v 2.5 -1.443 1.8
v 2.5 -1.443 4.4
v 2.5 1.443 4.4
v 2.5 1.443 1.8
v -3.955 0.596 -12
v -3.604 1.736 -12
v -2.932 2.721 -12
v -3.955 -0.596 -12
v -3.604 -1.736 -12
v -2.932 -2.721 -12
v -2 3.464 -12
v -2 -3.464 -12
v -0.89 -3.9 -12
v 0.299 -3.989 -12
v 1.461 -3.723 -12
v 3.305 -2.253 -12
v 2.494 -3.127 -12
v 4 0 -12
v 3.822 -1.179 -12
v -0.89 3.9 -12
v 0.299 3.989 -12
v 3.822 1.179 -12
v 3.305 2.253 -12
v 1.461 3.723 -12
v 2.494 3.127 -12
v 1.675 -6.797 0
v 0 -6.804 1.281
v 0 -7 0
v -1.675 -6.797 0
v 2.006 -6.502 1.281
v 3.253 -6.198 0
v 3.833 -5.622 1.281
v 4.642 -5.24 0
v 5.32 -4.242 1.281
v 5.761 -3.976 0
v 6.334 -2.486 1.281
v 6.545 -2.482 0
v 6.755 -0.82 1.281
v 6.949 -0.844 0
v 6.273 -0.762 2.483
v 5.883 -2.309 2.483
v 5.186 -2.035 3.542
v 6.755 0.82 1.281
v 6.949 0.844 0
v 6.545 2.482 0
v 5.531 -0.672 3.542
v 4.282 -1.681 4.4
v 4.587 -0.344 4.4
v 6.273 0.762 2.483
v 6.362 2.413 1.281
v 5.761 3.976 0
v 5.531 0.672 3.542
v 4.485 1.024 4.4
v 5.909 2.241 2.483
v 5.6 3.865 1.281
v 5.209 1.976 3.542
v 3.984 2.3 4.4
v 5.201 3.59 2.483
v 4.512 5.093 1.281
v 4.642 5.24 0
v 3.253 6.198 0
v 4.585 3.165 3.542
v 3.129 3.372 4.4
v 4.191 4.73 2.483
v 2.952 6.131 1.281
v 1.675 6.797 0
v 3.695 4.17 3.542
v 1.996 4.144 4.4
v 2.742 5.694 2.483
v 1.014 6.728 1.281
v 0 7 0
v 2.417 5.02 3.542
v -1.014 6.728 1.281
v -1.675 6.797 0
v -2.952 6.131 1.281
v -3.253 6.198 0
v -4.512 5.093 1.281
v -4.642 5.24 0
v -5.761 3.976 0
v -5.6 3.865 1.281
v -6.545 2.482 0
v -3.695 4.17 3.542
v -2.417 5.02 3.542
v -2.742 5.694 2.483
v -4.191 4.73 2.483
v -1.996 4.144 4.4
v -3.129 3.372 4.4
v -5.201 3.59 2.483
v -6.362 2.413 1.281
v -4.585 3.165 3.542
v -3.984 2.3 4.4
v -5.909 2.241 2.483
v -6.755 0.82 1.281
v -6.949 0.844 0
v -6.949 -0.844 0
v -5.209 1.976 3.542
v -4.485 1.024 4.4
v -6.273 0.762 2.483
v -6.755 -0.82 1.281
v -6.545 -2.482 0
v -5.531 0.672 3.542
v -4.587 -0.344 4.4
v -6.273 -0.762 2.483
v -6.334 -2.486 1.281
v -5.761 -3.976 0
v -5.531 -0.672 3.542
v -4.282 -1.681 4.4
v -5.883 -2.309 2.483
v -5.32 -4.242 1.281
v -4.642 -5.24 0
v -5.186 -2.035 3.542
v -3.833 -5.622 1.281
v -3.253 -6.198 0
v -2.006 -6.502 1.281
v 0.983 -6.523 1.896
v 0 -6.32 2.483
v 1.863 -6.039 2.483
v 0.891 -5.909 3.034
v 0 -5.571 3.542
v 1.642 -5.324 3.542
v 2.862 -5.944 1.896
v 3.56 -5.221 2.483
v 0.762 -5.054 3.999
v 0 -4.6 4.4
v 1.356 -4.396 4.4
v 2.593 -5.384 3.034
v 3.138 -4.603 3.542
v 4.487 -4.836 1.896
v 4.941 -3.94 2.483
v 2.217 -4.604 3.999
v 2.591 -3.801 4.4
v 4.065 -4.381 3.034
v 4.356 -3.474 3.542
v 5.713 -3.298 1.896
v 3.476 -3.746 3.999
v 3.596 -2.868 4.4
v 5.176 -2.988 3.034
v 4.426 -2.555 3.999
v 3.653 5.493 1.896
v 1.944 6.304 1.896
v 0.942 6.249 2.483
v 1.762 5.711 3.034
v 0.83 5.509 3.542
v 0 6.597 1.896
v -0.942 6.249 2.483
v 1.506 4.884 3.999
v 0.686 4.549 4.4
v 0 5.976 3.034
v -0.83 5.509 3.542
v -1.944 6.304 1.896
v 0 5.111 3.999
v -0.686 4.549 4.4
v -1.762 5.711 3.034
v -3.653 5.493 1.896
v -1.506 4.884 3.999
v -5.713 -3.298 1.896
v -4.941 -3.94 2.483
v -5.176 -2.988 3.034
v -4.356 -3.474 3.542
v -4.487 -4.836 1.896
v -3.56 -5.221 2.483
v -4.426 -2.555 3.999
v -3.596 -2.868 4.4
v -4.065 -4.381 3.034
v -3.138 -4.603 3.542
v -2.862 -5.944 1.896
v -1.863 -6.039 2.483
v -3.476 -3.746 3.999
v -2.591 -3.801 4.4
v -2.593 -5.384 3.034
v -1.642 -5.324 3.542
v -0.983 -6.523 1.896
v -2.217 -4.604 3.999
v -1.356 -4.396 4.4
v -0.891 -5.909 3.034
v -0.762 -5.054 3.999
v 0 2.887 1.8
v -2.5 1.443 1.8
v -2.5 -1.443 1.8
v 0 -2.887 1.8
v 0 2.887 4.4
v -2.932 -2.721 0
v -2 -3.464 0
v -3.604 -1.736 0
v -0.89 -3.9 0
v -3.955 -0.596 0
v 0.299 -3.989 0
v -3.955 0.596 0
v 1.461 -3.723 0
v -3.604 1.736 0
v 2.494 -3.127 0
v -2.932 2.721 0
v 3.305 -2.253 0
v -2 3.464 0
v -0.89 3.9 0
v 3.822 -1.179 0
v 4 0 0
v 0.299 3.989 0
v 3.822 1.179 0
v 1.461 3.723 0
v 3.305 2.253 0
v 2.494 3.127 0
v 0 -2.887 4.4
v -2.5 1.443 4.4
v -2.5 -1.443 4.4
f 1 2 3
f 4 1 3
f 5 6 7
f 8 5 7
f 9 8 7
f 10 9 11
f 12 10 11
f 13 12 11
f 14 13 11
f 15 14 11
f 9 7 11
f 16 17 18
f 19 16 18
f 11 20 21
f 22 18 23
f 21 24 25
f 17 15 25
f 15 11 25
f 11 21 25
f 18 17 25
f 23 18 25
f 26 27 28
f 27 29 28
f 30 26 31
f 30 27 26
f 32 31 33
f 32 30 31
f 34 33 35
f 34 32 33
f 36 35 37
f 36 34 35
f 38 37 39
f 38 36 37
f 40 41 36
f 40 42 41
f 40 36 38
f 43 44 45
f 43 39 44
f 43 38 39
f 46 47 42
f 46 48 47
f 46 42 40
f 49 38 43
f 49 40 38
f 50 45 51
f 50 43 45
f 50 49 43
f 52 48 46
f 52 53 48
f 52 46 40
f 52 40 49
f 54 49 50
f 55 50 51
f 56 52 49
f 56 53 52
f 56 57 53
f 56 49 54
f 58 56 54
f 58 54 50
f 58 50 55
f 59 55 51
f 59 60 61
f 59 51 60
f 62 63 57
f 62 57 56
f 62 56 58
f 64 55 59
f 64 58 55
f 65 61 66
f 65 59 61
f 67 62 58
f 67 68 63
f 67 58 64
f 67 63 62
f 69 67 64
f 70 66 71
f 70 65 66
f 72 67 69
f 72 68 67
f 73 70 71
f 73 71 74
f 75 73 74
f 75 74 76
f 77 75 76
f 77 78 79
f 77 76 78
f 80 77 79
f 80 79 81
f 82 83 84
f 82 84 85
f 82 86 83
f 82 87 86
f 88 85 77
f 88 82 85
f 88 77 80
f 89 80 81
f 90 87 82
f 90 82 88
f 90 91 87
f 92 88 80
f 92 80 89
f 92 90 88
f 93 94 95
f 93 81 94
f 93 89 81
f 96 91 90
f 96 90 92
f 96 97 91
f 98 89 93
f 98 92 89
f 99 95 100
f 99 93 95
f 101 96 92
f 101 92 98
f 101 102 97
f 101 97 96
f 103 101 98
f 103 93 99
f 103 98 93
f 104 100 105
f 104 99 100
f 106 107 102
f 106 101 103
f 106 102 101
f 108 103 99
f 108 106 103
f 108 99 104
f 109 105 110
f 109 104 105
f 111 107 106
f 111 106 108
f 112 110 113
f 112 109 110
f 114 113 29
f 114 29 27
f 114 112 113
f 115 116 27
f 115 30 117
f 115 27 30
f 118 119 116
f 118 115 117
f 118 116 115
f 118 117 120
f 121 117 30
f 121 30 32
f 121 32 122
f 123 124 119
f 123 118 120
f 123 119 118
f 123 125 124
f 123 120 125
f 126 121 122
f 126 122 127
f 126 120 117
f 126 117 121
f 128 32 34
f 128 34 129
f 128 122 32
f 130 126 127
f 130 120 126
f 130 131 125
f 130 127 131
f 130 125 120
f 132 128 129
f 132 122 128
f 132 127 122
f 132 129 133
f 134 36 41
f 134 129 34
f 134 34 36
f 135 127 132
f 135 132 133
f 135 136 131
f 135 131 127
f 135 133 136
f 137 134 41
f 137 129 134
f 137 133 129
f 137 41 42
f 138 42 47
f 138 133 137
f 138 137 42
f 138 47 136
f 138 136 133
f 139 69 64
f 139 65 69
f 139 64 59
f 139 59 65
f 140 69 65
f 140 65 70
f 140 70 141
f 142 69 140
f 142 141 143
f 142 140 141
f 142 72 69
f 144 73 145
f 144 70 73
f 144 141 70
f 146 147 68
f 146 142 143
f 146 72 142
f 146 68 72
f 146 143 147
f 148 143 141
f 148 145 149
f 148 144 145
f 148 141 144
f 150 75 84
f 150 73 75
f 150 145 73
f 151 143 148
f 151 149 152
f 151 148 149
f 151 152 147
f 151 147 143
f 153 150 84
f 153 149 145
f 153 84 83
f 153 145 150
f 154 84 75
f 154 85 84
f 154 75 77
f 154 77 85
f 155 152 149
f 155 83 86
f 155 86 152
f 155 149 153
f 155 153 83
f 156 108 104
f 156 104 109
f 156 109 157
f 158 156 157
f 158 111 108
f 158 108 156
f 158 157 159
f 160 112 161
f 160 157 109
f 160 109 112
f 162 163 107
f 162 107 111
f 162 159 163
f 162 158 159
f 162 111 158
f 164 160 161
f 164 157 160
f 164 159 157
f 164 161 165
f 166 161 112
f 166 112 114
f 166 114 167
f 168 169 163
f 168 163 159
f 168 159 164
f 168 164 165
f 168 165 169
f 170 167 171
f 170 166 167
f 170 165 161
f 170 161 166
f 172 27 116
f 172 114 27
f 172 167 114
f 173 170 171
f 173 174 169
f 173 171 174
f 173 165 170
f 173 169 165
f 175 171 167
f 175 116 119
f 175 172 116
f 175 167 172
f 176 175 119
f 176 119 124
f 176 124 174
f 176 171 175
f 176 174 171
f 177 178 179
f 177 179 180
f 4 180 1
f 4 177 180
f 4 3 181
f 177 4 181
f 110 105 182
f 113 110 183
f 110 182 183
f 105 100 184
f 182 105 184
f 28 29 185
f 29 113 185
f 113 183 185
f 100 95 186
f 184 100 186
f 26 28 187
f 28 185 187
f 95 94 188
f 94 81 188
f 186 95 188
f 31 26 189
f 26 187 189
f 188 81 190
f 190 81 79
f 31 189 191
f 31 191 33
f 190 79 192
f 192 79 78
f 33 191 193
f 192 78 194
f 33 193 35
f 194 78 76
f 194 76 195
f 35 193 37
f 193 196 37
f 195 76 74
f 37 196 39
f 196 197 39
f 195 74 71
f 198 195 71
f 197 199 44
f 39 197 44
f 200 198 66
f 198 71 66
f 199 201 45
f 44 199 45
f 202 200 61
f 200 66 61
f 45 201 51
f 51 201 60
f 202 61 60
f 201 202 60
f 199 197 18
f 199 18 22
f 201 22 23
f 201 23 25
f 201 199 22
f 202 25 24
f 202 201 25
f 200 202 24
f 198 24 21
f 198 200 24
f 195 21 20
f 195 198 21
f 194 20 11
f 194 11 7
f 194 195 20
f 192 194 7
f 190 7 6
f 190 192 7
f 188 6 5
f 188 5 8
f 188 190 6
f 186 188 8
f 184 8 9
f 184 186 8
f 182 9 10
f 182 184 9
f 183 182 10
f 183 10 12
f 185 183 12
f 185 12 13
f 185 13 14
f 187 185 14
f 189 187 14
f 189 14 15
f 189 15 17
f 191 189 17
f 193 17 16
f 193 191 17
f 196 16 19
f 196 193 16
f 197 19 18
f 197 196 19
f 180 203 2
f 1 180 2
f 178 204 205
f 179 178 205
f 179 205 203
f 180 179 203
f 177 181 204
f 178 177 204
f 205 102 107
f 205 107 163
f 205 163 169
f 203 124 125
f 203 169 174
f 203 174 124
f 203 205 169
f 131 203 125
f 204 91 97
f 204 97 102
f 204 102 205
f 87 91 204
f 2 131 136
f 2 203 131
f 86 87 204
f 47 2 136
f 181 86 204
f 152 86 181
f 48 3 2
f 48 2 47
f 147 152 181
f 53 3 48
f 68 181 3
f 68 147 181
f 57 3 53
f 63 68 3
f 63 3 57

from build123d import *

# Parameters (mm, degrees)
F0_R     = 7
F1_DEPTH = 4.4
F3_DEPTH = 2.6
F6_R     = 4
F7_DEPTH = 12


with BuildPart() as f1:
    # F0 (on Top) → F1 (new body)
    with BuildSketch(Plane.XY):
        Circle(F0_R)
    extrude(amount=F1_DEPTH)

    # F2 (on face) → F3 (cut)
    with BuildSketch(Plane.XY.offset(4.4)):
        Polygon((2.5, -1.443376), (2.5, 1.443376), (0, 2.886751), (-2.5, 1.443376), (-2.5, -1.443376), (0, -2.886751), align=None)
    extrude(amount=-F3_DEPTH, mode=Mode.SUBTRACT)

    # F4 (on Right) → F5 (revolve, cut)
    with BuildSketch(Plane.YZ):
        with BuildLine():
            Line((-7, 4.4), (-7, 0))
            ThreePointArc((-7, 0), (-6.319513, 2.483371), (-4.6, 4.4))
            Line((-4.6, 4.4), (-7, 4.4))
        make_face()
    revolve(axis=Axis((0, 0, 2.2), (0, 0, 1)), mode=Mode.SUBTRACT)

    # F6 (on Top) → F7 (join)
    with BuildSketch(Plane.XY):
        Circle(F6_R)
    extrude(amount=-F7_DEPTH)


solid = f1.part
